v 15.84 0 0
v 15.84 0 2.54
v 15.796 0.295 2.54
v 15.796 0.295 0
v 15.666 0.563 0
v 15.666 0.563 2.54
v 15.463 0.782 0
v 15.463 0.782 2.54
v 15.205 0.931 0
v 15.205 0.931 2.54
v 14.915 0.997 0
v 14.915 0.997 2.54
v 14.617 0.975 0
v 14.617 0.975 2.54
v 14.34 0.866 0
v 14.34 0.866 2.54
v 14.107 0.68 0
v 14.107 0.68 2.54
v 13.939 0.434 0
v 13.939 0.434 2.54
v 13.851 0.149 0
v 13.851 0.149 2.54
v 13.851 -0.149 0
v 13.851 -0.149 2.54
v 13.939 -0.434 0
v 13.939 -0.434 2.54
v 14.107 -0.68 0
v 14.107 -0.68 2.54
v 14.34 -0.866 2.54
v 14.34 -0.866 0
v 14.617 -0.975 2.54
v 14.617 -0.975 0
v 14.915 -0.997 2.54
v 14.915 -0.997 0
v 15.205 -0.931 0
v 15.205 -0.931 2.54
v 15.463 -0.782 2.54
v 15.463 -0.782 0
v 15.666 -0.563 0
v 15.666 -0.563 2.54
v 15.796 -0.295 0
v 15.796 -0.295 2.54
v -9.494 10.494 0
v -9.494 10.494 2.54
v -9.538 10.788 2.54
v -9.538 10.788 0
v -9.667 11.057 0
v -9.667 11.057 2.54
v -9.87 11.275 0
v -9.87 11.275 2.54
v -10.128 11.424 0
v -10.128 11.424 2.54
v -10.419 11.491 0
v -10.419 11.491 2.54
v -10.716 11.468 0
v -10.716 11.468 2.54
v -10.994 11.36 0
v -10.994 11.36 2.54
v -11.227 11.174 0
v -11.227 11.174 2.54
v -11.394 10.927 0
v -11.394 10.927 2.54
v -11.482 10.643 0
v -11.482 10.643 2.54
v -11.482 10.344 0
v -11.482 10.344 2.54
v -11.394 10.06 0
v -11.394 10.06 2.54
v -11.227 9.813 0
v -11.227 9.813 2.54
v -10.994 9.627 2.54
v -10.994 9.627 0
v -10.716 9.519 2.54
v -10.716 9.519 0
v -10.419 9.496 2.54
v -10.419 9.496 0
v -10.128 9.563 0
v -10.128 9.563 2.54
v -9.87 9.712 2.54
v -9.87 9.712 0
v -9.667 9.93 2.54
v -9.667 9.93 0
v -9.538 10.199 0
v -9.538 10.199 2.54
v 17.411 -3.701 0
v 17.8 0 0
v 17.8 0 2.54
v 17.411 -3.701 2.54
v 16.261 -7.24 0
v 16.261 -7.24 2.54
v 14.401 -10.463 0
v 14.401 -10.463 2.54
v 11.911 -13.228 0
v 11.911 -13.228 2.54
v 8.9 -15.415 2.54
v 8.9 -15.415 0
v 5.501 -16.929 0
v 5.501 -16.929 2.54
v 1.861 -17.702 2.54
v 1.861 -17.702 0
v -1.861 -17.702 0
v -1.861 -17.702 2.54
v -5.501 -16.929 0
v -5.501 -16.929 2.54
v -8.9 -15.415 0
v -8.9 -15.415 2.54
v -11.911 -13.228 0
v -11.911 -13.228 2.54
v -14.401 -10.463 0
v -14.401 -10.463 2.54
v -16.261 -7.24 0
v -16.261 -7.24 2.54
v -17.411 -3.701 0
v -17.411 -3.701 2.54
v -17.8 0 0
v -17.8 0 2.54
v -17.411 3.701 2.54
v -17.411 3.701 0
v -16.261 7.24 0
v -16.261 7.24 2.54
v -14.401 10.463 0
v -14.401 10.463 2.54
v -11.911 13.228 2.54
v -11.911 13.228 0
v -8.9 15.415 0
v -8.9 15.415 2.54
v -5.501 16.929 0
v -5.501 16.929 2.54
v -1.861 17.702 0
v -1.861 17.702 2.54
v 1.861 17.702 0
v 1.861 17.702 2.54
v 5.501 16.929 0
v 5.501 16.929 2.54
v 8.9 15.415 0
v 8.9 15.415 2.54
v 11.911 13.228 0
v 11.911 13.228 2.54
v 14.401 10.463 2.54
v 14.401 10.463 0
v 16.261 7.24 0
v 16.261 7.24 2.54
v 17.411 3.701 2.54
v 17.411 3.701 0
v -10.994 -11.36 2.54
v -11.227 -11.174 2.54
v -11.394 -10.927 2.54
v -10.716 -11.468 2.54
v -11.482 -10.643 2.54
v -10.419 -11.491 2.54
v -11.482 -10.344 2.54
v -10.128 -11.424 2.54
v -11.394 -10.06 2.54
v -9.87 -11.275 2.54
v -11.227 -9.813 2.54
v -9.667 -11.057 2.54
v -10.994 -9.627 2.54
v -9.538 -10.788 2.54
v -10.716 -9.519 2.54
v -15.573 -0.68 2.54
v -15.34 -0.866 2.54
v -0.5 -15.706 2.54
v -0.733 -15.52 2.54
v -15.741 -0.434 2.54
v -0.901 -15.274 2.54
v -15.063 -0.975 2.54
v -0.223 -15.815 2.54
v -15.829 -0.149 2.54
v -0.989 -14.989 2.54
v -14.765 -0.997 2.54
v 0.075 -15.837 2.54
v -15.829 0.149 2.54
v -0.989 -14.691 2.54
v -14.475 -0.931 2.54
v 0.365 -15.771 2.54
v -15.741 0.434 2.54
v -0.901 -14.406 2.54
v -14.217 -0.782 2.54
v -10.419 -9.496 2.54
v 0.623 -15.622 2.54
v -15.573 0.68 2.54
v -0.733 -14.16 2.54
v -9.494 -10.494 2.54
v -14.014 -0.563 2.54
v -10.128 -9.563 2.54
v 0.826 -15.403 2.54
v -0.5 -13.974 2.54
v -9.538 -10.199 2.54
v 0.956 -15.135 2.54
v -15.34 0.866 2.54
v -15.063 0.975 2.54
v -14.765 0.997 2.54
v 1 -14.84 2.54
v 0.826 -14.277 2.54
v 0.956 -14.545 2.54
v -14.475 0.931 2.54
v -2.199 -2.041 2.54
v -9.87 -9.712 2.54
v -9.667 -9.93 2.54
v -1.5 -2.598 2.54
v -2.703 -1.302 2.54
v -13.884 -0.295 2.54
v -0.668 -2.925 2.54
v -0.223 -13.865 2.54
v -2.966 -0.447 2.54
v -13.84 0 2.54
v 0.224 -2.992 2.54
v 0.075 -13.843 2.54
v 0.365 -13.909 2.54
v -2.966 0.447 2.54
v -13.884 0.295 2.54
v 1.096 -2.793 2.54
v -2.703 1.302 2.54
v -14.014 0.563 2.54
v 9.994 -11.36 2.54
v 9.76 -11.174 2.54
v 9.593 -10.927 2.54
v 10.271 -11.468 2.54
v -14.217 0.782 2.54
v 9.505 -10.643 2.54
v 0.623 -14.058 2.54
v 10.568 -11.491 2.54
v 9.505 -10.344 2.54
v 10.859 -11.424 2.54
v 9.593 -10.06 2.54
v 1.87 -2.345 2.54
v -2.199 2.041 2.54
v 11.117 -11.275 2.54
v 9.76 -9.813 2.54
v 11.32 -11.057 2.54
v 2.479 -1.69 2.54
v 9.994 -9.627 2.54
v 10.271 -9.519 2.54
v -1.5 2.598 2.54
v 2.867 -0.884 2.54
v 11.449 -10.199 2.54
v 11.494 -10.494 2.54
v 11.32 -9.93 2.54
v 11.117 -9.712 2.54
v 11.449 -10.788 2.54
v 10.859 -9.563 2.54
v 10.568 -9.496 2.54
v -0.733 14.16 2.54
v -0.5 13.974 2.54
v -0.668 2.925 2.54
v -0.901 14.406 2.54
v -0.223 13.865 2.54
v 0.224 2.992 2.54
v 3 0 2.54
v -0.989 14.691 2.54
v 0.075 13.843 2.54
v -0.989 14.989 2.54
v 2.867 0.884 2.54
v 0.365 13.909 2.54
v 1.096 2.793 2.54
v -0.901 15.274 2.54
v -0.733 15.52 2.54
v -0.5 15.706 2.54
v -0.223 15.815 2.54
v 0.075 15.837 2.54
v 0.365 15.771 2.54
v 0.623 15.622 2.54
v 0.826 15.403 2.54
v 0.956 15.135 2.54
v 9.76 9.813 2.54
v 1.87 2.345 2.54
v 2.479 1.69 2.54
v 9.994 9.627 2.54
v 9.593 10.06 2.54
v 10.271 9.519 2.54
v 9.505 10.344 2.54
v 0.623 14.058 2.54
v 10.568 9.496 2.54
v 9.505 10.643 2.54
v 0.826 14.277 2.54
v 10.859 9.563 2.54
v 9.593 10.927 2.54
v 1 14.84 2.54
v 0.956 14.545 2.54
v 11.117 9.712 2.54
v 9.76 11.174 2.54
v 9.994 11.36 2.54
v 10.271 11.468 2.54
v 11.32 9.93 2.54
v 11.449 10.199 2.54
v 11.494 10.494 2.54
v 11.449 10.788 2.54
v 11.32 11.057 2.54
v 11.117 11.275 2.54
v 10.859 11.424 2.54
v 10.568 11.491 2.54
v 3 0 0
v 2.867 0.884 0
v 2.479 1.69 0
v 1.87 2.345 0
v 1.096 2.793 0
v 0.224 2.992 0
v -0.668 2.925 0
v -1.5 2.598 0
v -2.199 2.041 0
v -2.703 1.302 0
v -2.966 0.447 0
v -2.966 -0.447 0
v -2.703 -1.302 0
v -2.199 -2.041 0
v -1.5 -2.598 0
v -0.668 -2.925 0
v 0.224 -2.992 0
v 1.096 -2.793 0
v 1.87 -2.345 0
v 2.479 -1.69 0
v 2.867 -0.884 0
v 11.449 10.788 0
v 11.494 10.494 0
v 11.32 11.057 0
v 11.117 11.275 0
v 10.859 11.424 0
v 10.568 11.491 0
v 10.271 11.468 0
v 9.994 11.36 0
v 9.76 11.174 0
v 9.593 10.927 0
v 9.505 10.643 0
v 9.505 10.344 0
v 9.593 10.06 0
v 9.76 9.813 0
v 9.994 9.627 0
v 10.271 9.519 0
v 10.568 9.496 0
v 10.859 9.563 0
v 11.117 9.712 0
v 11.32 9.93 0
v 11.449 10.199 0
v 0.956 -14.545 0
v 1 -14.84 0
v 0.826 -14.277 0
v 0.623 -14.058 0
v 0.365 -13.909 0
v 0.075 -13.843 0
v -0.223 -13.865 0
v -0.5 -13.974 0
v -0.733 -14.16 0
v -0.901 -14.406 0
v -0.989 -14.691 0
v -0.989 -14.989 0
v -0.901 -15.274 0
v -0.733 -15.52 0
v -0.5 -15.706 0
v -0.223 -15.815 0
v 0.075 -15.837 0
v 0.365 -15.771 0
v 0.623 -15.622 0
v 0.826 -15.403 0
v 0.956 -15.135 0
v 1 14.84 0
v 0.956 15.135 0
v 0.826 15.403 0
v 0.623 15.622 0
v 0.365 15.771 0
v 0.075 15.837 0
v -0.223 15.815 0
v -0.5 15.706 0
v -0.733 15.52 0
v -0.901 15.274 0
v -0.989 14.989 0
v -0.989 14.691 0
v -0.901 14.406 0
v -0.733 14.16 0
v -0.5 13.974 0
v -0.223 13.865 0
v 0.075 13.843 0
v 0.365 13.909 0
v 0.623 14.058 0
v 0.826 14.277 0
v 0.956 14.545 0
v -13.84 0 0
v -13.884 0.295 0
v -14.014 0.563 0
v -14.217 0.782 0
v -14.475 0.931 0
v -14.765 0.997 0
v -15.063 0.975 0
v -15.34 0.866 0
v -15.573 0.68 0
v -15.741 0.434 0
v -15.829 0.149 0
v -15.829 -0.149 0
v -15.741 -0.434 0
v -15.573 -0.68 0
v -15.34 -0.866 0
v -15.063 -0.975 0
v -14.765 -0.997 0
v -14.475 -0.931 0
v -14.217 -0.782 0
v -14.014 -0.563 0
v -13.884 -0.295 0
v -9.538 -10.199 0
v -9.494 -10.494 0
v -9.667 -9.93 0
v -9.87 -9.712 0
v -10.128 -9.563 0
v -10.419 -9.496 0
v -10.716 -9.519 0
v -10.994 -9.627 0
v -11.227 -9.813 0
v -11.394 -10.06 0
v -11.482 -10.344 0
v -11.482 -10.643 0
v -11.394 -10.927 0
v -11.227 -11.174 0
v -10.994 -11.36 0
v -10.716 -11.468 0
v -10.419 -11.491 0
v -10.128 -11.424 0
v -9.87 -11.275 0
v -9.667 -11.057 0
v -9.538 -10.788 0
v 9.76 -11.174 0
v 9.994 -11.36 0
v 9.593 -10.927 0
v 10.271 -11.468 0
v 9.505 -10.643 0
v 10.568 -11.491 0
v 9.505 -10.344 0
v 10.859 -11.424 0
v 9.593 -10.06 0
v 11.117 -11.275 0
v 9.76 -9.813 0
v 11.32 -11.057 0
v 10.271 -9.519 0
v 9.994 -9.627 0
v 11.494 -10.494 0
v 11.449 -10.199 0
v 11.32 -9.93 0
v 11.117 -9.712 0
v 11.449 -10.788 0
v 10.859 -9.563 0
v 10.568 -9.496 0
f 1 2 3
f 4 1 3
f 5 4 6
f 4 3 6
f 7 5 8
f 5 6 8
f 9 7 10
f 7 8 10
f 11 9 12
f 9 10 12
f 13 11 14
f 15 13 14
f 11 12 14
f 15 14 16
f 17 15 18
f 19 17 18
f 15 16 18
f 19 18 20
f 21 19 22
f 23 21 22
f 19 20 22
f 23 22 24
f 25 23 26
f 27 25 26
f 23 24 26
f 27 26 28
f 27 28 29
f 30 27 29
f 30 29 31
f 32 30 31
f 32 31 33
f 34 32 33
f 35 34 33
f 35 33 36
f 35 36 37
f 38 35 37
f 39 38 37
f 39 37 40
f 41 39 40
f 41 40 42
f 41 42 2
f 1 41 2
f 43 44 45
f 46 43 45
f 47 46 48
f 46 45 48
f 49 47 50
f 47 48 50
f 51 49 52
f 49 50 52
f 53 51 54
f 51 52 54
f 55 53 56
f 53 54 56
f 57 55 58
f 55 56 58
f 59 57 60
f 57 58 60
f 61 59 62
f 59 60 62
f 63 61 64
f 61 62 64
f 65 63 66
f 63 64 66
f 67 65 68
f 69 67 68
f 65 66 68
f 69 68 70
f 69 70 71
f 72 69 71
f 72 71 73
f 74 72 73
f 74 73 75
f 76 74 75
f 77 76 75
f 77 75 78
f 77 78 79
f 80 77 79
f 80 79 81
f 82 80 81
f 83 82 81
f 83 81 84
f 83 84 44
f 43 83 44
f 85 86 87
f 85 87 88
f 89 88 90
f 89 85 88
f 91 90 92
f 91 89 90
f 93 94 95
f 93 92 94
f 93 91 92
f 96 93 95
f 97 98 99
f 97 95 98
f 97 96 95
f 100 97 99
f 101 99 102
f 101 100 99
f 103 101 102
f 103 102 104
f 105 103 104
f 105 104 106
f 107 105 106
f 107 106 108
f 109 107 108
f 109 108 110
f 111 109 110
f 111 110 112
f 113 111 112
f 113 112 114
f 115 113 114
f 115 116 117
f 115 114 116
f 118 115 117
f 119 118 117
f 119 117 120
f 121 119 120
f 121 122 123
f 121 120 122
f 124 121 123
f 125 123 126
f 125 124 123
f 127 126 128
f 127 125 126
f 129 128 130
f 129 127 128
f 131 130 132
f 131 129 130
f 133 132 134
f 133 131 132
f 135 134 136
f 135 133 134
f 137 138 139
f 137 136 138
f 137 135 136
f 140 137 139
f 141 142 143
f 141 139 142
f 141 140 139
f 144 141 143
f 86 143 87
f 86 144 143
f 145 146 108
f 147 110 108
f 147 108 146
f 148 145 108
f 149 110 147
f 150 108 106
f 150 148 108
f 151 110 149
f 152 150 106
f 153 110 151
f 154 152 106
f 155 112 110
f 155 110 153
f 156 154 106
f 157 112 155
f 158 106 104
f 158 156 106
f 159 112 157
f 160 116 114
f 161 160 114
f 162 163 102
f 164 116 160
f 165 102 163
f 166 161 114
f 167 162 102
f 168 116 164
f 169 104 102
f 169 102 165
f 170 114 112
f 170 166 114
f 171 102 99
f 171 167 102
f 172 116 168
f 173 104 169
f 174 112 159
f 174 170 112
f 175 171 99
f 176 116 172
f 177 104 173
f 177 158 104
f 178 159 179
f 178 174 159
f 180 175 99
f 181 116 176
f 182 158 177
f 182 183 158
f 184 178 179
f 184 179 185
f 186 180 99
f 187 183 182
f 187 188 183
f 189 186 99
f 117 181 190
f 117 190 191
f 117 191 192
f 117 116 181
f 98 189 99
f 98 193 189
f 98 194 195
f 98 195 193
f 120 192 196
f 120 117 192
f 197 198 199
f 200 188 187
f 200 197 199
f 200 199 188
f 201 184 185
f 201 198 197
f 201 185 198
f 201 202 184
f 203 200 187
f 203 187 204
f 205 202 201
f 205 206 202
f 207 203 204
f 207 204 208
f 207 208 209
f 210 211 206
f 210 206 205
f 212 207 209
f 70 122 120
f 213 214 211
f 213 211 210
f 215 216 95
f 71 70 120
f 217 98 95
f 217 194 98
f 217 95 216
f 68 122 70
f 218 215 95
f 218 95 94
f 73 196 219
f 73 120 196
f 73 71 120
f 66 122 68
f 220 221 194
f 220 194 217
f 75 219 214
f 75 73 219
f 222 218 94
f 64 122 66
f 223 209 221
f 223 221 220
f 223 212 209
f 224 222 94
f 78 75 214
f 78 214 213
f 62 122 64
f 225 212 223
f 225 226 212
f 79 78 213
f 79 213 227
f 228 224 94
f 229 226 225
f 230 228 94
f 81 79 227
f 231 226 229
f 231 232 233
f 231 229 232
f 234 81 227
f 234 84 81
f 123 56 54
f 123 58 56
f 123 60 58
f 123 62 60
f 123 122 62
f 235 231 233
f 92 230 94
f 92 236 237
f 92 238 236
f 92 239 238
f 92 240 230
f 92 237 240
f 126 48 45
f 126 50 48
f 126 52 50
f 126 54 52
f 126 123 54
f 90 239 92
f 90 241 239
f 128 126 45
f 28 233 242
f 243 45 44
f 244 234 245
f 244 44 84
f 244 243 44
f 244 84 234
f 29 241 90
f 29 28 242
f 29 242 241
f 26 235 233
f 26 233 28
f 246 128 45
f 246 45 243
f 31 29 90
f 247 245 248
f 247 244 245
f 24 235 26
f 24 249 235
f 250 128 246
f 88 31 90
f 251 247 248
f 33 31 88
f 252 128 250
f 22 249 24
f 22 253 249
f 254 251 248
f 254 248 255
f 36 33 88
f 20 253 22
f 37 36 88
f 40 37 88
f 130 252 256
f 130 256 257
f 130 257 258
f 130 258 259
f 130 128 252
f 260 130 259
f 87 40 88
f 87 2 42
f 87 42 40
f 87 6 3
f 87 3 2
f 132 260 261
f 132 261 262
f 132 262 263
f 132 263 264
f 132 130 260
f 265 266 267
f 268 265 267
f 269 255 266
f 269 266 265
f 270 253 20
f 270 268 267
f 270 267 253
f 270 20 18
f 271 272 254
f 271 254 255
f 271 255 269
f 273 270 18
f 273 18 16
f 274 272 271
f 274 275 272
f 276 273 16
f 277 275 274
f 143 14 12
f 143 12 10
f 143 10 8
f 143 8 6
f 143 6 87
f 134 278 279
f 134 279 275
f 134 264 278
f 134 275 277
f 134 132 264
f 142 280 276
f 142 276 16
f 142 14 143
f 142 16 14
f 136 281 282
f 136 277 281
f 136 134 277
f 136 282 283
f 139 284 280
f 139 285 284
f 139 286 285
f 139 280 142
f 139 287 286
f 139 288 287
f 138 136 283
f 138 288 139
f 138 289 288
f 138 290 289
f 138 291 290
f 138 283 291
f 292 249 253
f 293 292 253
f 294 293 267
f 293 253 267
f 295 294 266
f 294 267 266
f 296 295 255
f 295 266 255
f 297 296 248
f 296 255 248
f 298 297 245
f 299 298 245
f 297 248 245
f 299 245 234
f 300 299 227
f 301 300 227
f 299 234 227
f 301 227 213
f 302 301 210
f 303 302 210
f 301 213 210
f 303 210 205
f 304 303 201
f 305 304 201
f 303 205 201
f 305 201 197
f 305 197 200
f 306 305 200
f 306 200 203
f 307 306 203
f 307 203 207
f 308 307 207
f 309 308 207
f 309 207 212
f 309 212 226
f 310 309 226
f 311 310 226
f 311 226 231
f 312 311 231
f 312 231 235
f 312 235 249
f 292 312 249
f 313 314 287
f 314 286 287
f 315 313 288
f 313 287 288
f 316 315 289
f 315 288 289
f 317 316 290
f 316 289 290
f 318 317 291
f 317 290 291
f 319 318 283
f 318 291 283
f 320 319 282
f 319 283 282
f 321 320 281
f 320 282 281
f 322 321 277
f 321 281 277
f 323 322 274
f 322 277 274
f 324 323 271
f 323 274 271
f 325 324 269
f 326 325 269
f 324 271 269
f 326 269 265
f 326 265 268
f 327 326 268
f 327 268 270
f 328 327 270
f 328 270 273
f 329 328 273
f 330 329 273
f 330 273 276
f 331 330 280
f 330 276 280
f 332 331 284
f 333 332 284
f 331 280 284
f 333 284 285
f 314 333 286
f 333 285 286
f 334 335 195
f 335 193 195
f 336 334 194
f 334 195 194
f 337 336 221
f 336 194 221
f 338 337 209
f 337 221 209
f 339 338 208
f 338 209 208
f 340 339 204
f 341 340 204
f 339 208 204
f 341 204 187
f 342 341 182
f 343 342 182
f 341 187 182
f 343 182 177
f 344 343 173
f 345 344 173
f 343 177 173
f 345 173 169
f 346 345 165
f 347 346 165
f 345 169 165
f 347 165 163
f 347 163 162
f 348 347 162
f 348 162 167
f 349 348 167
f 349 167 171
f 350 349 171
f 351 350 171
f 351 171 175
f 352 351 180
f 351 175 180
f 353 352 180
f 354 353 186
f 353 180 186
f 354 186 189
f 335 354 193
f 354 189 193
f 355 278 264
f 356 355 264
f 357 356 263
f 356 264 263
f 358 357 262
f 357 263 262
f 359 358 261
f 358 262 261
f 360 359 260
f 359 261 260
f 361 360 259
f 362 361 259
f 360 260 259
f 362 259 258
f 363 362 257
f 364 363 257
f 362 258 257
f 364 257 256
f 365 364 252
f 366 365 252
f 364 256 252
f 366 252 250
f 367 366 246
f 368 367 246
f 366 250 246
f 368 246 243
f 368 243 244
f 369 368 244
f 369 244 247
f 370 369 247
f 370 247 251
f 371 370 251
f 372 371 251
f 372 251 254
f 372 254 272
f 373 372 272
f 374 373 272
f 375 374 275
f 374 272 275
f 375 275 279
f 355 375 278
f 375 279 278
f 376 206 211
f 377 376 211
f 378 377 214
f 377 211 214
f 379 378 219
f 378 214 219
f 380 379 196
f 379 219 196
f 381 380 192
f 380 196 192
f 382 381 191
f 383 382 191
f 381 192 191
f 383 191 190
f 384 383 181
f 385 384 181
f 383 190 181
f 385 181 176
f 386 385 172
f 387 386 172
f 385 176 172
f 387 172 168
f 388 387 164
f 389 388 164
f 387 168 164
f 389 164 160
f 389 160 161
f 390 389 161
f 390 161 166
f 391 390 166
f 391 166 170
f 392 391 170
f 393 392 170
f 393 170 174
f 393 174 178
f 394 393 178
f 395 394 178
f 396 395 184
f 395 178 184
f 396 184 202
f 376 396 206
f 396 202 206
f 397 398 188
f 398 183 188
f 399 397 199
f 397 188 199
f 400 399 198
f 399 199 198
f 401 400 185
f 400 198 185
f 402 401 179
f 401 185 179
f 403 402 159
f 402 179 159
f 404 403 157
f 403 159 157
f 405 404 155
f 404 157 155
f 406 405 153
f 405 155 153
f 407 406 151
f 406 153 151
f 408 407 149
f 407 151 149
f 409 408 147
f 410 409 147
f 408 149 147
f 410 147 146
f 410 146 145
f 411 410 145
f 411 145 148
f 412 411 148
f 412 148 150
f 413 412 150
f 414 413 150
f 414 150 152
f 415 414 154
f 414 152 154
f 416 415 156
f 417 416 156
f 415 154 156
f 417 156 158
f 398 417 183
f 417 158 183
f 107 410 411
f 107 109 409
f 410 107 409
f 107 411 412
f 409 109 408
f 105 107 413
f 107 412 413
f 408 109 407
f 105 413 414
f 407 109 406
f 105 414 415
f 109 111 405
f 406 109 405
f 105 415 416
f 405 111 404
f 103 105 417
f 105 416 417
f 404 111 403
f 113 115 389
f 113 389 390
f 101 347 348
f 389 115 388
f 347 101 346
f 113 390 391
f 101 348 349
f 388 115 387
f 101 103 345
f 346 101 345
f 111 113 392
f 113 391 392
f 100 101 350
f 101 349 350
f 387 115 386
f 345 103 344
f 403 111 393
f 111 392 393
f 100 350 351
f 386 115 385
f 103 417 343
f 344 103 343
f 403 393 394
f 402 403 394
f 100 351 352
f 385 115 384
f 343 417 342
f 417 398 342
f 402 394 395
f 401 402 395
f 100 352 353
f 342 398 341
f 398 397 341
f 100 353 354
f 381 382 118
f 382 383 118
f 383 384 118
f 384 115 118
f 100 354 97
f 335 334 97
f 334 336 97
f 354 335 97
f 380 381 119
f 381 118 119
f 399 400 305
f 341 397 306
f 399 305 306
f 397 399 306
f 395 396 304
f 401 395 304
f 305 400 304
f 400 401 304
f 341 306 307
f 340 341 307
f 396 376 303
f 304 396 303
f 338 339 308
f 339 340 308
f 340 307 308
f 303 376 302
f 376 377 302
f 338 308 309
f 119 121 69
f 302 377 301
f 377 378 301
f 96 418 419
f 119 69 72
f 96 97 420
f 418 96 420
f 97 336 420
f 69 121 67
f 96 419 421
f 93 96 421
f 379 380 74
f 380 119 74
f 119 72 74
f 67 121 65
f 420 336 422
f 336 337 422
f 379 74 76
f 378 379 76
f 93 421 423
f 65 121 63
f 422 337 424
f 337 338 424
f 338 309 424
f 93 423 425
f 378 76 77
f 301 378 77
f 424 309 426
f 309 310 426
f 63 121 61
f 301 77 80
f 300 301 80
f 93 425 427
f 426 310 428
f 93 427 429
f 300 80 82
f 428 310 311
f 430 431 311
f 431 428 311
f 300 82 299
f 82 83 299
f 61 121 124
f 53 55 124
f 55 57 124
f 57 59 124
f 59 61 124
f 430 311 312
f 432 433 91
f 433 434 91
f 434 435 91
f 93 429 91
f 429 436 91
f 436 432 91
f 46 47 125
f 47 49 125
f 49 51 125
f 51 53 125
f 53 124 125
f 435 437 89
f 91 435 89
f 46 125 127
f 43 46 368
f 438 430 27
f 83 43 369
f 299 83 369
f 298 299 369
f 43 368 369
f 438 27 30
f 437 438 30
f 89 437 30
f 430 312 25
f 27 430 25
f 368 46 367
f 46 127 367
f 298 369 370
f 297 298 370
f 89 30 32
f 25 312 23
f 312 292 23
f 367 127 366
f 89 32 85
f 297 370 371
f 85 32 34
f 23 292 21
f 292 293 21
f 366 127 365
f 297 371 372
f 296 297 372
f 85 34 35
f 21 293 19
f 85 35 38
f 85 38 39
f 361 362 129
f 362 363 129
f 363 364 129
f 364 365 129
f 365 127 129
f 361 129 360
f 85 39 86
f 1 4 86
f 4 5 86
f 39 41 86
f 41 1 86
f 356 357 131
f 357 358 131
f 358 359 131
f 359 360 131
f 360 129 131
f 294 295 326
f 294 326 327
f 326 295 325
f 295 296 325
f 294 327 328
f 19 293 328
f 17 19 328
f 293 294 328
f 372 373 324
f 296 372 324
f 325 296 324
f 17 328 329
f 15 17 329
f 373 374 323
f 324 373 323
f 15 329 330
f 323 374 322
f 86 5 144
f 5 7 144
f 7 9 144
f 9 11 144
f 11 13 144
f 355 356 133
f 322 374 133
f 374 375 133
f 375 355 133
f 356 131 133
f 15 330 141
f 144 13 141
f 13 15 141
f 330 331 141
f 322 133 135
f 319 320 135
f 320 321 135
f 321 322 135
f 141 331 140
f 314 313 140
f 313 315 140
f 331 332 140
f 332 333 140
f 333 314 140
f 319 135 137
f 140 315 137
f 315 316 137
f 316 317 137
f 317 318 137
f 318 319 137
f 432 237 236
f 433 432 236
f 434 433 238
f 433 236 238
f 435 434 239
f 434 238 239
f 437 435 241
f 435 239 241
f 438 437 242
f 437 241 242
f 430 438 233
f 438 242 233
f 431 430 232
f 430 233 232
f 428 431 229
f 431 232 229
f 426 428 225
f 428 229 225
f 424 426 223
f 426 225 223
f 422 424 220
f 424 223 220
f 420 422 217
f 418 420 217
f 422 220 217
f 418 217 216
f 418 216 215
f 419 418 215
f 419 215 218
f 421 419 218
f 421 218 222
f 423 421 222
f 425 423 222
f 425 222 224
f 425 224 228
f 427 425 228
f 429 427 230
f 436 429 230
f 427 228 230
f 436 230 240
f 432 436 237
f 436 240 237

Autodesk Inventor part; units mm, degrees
ref_plane "YZ Plane" through (0, 0, 0) normal (1, 0, 0) x (0, 1, 0)
ref_plane "XZ Plane" through (0, 0, 0) normal (0, 1, 0) x (-1, 0, 0)
ref_plane "XY Plane" through (0, 0, 0) normal (0, 0, 1) x (1, 0, 0)
sketch "Sketch1" plane through (0, 0, 0) normal (0, 0, 1) x (1, 0, 0)
  circle A0 centre (0, 0) radius 17.8
  dimension "d0" = 35.6
extrude "Extrusion1" add sketch "Sketch1" along normal blind 2.54
sketch "Sketch2" plane through (0, 0, 2.54) normal (0, 0, 1) x (1, 0, 0)
  circle A0 centre (0, 0) radius 17.8 projected
  line L0 (-24.92, 0) -> (24.92, 0) projected
  line L1 (0, -24.92) -> (0, 24.92) projected
  circle A1 centre (0, 14.84) radius 1
  circle A2 centre (-10.4935, 10.4935) radius 1
  circle A3 centre (-14.84, 0) radius 1
  circle A4 centre (-10.4935, -10.4935) radius 1
  circle A5 centre (0, -14.84) radius 1
  circle A6 centre (10.4935, -10.4935) radius 1
  circle A7 centre (14.84, 0) radius 1
  circle A8 centre (10.4935, 10.4935) radius 1
  circle A9 centre (0, 0) radius 3
  dimension "d3" = 2
  dimension "d4" = 14.84
  dimension "d7" = 360
  dimension "d9" = 6
extrude "Extrusion2" cut sketch "Sketch2" against normal blind 2.54 contours A7 L0 | L0 A7 | A1 L1 | L1 A1 | A5 L1 | L1 A5 | A3 L0 | L0 A3 | A9 L1 L0 | L0 L1 A9 | L1 L0 A9 | A9 L0 L1 | A2 | A4 | A6 | A8
properties part number "ServoFutabaS3003_circularArm"
